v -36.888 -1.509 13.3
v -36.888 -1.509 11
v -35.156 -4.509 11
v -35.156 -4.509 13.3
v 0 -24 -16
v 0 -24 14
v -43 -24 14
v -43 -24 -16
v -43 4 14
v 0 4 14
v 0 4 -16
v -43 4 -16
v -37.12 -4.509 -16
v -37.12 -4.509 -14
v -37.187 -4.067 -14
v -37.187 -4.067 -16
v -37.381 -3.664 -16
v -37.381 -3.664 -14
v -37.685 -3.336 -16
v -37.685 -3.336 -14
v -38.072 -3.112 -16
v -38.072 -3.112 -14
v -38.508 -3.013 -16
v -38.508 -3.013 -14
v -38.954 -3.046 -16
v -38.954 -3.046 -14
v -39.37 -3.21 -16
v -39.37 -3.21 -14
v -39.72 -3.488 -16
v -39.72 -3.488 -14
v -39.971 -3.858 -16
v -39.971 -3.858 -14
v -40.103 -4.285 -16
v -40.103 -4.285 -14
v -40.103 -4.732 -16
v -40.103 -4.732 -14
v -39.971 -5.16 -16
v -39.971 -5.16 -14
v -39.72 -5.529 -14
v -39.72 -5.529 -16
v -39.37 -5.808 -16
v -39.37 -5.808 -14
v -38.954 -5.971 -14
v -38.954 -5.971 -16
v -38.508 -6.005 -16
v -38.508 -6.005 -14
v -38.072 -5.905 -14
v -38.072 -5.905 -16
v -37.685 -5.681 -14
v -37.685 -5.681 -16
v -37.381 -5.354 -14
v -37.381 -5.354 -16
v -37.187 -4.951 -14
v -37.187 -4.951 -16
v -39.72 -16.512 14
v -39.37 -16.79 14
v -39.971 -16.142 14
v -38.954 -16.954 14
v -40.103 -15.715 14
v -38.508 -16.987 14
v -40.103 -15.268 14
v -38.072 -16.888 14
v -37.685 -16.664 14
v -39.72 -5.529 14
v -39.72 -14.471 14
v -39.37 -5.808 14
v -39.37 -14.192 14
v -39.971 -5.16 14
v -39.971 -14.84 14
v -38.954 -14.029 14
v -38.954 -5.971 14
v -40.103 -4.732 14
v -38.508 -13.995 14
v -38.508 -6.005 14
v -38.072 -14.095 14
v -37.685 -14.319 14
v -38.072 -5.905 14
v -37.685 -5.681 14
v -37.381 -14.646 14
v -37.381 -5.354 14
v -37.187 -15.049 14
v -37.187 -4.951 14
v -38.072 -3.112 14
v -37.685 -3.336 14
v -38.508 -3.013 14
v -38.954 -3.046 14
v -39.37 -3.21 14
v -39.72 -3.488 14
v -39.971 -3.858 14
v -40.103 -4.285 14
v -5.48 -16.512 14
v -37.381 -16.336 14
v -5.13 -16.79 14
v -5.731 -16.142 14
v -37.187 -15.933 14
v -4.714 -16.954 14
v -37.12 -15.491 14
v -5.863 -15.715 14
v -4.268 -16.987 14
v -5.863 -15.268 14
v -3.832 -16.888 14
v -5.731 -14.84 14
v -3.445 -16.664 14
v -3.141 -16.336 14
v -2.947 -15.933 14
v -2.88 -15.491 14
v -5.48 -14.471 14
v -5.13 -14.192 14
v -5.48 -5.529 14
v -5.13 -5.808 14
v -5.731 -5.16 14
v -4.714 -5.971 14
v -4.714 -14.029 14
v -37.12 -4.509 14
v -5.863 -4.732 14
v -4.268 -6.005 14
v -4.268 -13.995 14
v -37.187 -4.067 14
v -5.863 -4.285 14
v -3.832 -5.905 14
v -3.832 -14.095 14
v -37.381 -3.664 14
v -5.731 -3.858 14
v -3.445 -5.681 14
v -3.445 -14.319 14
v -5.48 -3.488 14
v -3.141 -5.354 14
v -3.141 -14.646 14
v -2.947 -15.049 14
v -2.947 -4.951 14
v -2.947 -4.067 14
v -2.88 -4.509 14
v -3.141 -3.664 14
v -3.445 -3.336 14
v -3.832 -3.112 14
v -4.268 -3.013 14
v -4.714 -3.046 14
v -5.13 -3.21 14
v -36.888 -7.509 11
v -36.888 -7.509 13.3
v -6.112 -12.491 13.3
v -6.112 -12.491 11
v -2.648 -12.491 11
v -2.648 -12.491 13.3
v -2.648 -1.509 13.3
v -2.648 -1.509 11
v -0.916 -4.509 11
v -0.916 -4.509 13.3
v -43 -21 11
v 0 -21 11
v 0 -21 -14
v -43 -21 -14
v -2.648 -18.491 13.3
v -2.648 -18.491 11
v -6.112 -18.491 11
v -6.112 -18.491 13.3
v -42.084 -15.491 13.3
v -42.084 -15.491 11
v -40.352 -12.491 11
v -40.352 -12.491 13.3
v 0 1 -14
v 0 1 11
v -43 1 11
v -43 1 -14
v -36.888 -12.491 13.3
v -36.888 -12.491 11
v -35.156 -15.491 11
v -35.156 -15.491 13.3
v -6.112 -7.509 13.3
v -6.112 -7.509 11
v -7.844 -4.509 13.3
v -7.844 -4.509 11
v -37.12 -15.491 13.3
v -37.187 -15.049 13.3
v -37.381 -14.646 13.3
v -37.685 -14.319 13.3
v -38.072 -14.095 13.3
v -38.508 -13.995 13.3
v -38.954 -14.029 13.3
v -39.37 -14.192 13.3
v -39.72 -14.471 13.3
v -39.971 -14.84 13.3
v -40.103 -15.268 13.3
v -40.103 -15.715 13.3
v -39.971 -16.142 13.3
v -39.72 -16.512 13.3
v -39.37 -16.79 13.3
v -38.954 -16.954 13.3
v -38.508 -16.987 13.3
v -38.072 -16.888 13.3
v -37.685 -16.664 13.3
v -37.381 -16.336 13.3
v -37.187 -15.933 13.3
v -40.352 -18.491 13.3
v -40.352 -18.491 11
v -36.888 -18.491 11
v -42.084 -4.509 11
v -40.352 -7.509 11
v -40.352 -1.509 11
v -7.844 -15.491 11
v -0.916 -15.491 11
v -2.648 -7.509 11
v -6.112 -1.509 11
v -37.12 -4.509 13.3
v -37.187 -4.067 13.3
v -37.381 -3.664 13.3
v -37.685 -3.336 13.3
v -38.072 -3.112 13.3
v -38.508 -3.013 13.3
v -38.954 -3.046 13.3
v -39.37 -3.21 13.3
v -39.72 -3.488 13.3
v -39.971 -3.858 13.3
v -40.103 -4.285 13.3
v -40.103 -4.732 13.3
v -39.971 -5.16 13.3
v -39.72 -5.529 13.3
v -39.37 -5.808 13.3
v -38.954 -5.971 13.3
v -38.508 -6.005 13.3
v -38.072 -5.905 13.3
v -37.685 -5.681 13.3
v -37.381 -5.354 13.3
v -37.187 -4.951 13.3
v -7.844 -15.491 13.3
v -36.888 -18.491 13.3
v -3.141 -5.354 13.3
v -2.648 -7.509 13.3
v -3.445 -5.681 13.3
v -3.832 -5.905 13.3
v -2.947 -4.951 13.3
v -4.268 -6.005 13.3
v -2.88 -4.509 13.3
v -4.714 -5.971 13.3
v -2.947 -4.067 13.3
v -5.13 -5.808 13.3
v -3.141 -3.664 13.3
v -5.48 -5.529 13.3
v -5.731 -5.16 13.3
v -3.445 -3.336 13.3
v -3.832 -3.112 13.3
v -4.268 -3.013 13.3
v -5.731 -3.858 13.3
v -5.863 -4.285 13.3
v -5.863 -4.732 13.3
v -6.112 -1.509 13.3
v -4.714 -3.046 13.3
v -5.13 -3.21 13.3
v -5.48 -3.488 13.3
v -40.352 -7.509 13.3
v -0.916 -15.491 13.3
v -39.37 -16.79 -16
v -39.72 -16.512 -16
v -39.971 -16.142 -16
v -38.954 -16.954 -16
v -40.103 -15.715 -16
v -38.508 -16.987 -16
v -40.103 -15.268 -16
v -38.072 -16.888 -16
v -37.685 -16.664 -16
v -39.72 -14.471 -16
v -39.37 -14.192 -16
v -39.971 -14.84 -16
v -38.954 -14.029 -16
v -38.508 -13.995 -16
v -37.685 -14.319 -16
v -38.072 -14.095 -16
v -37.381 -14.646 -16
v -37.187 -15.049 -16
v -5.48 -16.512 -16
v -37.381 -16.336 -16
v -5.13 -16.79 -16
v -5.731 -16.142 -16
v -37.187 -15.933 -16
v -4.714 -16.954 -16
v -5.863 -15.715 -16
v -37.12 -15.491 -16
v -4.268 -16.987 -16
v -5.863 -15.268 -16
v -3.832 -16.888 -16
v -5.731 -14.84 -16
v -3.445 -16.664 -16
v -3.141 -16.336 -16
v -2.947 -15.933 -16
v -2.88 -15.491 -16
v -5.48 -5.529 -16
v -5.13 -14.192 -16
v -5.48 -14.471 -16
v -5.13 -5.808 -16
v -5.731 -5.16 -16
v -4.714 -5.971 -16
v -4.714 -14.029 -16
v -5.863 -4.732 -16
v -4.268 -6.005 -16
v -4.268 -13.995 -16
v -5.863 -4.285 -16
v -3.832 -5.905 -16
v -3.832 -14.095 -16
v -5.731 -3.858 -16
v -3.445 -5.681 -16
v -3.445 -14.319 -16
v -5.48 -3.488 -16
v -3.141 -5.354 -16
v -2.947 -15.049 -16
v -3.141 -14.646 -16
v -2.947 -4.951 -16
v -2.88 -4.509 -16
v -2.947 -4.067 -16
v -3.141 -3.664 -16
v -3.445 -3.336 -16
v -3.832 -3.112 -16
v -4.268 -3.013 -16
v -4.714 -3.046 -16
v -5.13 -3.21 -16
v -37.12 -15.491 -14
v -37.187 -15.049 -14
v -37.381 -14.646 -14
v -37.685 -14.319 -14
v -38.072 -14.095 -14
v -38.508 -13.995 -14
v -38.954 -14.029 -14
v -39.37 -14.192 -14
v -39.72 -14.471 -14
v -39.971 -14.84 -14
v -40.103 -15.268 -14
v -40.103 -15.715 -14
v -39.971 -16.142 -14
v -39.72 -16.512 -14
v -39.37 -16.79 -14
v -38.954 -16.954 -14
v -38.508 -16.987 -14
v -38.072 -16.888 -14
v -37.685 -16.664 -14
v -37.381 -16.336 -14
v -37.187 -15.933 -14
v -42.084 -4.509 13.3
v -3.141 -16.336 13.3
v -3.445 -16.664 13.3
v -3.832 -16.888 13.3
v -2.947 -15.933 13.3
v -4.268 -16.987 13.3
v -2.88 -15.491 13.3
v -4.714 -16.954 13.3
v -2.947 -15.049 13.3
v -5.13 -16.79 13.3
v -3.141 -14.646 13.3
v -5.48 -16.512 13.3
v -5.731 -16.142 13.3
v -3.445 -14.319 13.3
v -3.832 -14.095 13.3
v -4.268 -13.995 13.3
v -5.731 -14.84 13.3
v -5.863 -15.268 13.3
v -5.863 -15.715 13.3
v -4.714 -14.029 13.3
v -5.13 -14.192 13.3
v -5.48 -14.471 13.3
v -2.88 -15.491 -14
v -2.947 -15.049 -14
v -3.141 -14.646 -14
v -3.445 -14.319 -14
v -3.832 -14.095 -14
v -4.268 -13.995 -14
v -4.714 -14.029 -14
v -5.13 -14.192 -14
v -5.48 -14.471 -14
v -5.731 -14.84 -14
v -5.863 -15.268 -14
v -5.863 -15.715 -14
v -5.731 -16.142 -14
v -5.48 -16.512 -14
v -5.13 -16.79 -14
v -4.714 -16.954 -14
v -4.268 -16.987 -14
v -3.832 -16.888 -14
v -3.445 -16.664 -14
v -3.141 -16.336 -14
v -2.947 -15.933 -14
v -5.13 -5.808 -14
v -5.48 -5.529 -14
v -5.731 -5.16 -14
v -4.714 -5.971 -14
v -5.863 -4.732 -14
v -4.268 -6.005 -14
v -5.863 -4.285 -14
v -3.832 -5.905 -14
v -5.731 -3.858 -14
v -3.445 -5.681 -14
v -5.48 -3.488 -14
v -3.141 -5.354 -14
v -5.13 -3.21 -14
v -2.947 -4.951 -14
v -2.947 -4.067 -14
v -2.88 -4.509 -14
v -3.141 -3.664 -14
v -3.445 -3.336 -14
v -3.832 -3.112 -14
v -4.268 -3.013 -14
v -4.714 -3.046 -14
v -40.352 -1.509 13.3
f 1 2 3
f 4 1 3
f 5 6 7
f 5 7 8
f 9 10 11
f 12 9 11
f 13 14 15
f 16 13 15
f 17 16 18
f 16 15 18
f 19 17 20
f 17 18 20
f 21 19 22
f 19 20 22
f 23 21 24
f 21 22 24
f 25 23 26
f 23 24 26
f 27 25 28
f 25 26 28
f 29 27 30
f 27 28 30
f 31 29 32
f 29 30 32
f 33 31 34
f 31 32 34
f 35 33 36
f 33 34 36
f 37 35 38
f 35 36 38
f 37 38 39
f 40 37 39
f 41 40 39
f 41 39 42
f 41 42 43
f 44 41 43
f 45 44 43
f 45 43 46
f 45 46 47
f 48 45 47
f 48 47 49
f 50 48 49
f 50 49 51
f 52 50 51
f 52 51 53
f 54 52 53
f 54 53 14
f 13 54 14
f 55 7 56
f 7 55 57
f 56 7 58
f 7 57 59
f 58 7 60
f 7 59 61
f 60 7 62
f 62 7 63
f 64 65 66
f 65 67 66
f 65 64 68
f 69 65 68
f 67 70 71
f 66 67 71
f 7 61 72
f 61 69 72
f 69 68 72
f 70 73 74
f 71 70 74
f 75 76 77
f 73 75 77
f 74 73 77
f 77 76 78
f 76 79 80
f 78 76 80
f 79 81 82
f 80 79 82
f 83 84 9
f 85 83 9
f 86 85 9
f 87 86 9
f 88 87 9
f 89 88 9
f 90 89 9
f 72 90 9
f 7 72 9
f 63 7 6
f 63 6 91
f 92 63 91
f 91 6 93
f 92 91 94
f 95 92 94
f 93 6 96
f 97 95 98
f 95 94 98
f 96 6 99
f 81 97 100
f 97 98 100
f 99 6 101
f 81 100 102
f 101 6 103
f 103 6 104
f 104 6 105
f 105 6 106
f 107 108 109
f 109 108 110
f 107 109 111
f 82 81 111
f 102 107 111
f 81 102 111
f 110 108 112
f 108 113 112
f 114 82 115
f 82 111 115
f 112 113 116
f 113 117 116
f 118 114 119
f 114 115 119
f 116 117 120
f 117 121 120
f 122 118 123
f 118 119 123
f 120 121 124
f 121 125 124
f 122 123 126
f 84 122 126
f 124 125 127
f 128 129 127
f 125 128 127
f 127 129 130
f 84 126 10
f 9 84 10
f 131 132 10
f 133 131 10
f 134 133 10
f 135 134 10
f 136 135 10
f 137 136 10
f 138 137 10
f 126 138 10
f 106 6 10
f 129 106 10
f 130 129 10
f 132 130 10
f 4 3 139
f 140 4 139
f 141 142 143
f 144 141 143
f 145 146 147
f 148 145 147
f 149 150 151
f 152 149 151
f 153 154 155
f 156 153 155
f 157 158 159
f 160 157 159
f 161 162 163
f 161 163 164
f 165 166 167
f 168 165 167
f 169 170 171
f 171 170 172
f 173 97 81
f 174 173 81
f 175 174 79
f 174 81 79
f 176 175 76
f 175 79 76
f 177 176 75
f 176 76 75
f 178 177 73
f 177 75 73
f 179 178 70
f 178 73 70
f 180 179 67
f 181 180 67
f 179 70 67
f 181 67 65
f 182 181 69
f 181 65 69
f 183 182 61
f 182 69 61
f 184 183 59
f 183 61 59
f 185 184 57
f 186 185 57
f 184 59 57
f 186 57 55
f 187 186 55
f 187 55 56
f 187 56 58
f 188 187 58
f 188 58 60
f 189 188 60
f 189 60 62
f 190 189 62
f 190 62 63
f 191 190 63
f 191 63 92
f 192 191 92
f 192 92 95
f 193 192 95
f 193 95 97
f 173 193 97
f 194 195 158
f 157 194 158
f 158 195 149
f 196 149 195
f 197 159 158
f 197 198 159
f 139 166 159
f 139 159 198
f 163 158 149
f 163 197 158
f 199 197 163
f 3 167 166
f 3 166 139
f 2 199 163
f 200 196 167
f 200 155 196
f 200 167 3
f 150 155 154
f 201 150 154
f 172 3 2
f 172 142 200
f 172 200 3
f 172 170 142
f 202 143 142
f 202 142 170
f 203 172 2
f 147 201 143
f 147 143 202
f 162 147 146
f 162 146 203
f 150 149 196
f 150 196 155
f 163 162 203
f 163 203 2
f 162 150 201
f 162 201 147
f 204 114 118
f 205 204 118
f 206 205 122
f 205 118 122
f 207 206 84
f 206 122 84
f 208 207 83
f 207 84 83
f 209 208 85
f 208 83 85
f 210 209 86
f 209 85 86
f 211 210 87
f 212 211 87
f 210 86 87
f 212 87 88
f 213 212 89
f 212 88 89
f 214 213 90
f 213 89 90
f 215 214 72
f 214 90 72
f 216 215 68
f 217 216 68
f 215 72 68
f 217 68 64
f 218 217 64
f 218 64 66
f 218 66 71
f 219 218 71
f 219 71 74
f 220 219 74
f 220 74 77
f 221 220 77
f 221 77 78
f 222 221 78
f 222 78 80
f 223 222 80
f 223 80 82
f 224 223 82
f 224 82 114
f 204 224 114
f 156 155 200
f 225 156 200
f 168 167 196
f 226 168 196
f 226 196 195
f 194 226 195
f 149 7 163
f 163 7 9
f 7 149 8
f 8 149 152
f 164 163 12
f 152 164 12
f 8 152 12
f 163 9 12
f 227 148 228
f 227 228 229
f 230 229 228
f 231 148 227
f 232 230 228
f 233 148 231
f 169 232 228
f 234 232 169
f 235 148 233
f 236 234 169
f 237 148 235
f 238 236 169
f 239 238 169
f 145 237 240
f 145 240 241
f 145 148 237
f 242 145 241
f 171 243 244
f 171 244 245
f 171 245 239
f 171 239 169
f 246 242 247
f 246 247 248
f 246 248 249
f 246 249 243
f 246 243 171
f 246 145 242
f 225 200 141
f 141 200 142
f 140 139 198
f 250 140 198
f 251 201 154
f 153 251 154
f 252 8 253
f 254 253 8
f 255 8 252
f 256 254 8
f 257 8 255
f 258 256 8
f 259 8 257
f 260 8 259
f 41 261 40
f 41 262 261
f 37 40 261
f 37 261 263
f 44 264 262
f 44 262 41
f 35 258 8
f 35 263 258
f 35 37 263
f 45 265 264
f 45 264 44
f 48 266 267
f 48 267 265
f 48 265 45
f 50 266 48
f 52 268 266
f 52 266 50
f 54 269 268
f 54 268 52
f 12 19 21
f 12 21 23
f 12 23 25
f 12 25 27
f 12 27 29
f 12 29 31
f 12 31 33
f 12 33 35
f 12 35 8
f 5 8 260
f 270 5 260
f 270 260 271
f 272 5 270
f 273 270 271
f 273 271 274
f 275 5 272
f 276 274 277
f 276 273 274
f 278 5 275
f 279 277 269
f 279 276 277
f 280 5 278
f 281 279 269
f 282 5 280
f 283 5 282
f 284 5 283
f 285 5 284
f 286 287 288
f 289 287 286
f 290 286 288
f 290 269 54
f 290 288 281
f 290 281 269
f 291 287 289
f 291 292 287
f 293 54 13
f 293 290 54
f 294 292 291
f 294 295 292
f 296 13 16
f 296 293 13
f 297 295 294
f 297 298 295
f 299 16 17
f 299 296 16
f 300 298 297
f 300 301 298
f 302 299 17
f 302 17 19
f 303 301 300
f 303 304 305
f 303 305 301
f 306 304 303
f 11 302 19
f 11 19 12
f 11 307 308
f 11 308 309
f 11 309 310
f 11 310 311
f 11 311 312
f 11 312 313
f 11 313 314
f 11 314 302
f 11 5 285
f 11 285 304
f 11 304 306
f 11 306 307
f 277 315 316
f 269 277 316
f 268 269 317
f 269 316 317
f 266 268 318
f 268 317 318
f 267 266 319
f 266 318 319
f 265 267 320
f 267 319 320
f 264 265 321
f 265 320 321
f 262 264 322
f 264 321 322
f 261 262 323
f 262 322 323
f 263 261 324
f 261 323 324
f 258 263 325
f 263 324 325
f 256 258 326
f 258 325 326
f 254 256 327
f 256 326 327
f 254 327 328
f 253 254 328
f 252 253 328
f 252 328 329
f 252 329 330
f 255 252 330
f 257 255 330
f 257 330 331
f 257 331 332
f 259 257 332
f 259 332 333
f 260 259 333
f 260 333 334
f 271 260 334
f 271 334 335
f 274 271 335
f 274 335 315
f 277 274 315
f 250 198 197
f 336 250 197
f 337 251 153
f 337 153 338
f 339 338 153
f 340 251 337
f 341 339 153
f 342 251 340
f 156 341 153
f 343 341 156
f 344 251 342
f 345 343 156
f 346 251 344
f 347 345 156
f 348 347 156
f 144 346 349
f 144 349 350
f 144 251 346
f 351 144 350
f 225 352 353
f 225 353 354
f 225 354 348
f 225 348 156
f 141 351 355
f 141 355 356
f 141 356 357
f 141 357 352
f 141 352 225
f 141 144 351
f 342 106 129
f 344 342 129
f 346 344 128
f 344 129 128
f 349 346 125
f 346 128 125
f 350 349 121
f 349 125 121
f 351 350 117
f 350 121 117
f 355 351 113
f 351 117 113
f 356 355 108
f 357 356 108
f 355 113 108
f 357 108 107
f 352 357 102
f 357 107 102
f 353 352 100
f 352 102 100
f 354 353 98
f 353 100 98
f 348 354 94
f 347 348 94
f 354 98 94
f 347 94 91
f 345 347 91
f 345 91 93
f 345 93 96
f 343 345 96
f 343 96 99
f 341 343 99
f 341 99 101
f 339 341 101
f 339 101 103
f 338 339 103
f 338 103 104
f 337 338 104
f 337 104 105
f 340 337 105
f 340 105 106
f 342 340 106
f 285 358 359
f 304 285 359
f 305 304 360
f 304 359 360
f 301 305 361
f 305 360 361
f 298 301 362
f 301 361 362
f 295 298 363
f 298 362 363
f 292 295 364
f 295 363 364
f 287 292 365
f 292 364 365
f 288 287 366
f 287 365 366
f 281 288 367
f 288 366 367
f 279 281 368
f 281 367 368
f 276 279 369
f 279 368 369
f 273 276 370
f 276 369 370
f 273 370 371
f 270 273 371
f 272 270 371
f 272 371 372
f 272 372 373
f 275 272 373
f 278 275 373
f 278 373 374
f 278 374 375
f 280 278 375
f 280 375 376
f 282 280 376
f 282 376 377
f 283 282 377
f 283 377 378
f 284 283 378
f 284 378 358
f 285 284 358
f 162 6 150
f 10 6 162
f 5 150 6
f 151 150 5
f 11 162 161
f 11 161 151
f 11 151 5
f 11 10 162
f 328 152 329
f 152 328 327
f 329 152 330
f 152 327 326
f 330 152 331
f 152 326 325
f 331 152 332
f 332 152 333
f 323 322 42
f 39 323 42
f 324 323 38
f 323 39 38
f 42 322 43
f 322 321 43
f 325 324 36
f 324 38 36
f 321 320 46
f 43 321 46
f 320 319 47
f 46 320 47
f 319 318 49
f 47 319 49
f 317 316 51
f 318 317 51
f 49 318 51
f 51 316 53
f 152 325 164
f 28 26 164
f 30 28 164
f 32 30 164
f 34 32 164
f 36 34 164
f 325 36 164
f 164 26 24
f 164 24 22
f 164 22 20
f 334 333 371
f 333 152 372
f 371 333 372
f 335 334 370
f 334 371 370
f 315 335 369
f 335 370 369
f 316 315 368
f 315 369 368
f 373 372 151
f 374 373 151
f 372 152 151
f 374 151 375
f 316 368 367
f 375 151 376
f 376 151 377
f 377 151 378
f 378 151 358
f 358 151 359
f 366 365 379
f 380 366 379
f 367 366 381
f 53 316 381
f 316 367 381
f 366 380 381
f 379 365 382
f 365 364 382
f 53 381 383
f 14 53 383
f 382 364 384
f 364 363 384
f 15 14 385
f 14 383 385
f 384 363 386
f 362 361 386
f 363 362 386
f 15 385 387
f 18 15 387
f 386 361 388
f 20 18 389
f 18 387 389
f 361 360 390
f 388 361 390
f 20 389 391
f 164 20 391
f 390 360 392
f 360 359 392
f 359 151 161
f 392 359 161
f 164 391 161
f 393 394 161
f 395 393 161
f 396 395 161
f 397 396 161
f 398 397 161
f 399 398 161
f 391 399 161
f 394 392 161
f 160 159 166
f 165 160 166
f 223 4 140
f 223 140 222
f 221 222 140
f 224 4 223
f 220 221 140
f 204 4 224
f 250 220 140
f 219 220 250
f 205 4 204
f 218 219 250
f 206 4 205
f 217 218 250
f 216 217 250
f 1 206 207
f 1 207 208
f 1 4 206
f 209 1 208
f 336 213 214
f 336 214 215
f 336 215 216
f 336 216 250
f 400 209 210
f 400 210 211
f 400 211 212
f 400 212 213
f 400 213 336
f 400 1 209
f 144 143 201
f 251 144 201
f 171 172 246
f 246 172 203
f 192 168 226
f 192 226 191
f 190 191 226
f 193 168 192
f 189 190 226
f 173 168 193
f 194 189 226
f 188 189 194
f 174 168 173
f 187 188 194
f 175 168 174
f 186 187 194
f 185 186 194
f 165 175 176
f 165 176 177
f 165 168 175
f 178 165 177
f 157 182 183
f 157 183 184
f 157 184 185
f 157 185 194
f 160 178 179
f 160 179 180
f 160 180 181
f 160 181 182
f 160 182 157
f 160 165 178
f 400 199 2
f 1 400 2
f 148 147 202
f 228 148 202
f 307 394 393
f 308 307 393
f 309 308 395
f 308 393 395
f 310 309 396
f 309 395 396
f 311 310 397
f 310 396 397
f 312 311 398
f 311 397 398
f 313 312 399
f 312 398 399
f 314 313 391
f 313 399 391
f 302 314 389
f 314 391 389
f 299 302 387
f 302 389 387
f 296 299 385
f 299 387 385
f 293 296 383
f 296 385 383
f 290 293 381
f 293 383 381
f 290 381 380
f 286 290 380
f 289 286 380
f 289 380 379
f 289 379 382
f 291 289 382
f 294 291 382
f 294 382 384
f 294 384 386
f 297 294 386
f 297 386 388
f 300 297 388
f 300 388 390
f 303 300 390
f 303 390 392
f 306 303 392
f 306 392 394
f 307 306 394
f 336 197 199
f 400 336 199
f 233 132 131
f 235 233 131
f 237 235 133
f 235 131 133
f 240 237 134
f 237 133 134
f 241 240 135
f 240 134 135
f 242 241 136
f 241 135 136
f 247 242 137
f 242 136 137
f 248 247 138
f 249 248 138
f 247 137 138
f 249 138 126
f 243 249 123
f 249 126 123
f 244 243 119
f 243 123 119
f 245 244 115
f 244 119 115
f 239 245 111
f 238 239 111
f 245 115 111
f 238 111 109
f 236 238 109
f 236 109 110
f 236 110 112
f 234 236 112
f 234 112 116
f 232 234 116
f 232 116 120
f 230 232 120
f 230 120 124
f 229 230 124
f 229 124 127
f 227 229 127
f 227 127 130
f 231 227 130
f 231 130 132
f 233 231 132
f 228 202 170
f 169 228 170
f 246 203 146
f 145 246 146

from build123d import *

# Parameters (mm, degrees)
SKETCH19_W          = 30
SKETCH19_H          = 28
SKETCH19_W_2        = 25
SKETCH19_H_2        = 22
BOSS_EXTRUDE1_DEPTH = 43
SKETCH30_R          = 1.5
CUT_EXTRUDE2_DEPTH  = 31
CUT_EXTRUDE4_DEPTH  = 2.3


with BuildPart() as part:
    # Sketch19 → Boss-Extrude1 (new body)
    with BuildSketch(Plane(origin=(0, 0, 0), x_dir=(0, 0, -1), z_dir=(1, 0, 0))):
        with Locations((1, -10)):
            Rectangle(SKETCH19_W, SKETCH19_H)
        with Locations((1.5, -10)):
            Rectangle(SKETCH19_W_2, SKETCH19_H_2, mode=Mode.SUBTRACT)
    extrude(amount=-BOSS_EXTRUDE1_DEPTH)

    # Sketch30 → Cut-Extrude2 (cut, through all)
    with BuildSketch(Plane.XY.offset(14)):
        with Locations((-38.62, -4.508713144)):
            Circle(SKETCH30_R)
        with Locations((-4.38, -4.508713144)):
            Circle(SKETCH30_R)
        with Locations((-4.38, -15.491286856)):
            Circle(SKETCH30_R)
        with Locations((-38.62, -15.491286856)):
            Circle(SKETCH30_R)
    extrude(amount=-CUT_EXTRUDE2_DEPTH, mode=Mode.SUBTRACT)

    # Sketch31 → Cut-Extrude4 (cut)
    with BuildSketch(Plane(origin=(0, 0, 11), x_dir=(-1, 0, 0), z_dir=(0, 0, -1))):
        Polygon((42.084101615, -4.508713144), (40.352050808, -1.508713144), (36.887949192, -1.508713144), (35.155898385, -4.508713144), (36.887949192, -7.508713144), (40.352050808, -7.508713144), align=None)
        Polygon((7.844101615, -4.508713144), (6.112050808, -1.508713144), (2.647949192, -1.508713144), (0.915898385, -4.508713144), (2.647949192, -7.508713144), (6.112050808, -7.508713144), align=None)
        Polygon((7.844101615, -15.491286856), (6.112050808, -12.491286856), (2.647949192, -12.491286856), (0.915898385, -15.491286856), (2.647949192, -18.491286856), (6.112050808, -18.491286856), align=None)
        Polygon((42.084101615, -15.491286856), (40.352050808, -12.491286856), (36.887949192, -12.491286856), (35.155898385, -15.491286856), (36.887949192, -18.491286856), (40.352050808, -18.491286856), align=None)
    extrude(amount=-CUT_EXTRUDE4_DEPTH, mode=Mode.SUBTRACT)


solid = part.part
